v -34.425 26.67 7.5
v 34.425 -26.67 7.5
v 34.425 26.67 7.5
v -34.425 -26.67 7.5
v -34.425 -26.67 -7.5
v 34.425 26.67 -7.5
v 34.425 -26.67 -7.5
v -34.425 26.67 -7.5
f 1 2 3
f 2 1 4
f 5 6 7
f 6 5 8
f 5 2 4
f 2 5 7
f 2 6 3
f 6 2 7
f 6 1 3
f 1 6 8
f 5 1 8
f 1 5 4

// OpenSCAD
// cajita-arduino-uno-r4
// por @montoyamoraga
// para @piruetasxyz

// ancho y largo en mm
// arduino uno r4 wifi
ancho = 68.85;
largo = 53.34;
// TODO: revisar altura
altura = 15;



cube([ancho, largo, altura], center = true);
